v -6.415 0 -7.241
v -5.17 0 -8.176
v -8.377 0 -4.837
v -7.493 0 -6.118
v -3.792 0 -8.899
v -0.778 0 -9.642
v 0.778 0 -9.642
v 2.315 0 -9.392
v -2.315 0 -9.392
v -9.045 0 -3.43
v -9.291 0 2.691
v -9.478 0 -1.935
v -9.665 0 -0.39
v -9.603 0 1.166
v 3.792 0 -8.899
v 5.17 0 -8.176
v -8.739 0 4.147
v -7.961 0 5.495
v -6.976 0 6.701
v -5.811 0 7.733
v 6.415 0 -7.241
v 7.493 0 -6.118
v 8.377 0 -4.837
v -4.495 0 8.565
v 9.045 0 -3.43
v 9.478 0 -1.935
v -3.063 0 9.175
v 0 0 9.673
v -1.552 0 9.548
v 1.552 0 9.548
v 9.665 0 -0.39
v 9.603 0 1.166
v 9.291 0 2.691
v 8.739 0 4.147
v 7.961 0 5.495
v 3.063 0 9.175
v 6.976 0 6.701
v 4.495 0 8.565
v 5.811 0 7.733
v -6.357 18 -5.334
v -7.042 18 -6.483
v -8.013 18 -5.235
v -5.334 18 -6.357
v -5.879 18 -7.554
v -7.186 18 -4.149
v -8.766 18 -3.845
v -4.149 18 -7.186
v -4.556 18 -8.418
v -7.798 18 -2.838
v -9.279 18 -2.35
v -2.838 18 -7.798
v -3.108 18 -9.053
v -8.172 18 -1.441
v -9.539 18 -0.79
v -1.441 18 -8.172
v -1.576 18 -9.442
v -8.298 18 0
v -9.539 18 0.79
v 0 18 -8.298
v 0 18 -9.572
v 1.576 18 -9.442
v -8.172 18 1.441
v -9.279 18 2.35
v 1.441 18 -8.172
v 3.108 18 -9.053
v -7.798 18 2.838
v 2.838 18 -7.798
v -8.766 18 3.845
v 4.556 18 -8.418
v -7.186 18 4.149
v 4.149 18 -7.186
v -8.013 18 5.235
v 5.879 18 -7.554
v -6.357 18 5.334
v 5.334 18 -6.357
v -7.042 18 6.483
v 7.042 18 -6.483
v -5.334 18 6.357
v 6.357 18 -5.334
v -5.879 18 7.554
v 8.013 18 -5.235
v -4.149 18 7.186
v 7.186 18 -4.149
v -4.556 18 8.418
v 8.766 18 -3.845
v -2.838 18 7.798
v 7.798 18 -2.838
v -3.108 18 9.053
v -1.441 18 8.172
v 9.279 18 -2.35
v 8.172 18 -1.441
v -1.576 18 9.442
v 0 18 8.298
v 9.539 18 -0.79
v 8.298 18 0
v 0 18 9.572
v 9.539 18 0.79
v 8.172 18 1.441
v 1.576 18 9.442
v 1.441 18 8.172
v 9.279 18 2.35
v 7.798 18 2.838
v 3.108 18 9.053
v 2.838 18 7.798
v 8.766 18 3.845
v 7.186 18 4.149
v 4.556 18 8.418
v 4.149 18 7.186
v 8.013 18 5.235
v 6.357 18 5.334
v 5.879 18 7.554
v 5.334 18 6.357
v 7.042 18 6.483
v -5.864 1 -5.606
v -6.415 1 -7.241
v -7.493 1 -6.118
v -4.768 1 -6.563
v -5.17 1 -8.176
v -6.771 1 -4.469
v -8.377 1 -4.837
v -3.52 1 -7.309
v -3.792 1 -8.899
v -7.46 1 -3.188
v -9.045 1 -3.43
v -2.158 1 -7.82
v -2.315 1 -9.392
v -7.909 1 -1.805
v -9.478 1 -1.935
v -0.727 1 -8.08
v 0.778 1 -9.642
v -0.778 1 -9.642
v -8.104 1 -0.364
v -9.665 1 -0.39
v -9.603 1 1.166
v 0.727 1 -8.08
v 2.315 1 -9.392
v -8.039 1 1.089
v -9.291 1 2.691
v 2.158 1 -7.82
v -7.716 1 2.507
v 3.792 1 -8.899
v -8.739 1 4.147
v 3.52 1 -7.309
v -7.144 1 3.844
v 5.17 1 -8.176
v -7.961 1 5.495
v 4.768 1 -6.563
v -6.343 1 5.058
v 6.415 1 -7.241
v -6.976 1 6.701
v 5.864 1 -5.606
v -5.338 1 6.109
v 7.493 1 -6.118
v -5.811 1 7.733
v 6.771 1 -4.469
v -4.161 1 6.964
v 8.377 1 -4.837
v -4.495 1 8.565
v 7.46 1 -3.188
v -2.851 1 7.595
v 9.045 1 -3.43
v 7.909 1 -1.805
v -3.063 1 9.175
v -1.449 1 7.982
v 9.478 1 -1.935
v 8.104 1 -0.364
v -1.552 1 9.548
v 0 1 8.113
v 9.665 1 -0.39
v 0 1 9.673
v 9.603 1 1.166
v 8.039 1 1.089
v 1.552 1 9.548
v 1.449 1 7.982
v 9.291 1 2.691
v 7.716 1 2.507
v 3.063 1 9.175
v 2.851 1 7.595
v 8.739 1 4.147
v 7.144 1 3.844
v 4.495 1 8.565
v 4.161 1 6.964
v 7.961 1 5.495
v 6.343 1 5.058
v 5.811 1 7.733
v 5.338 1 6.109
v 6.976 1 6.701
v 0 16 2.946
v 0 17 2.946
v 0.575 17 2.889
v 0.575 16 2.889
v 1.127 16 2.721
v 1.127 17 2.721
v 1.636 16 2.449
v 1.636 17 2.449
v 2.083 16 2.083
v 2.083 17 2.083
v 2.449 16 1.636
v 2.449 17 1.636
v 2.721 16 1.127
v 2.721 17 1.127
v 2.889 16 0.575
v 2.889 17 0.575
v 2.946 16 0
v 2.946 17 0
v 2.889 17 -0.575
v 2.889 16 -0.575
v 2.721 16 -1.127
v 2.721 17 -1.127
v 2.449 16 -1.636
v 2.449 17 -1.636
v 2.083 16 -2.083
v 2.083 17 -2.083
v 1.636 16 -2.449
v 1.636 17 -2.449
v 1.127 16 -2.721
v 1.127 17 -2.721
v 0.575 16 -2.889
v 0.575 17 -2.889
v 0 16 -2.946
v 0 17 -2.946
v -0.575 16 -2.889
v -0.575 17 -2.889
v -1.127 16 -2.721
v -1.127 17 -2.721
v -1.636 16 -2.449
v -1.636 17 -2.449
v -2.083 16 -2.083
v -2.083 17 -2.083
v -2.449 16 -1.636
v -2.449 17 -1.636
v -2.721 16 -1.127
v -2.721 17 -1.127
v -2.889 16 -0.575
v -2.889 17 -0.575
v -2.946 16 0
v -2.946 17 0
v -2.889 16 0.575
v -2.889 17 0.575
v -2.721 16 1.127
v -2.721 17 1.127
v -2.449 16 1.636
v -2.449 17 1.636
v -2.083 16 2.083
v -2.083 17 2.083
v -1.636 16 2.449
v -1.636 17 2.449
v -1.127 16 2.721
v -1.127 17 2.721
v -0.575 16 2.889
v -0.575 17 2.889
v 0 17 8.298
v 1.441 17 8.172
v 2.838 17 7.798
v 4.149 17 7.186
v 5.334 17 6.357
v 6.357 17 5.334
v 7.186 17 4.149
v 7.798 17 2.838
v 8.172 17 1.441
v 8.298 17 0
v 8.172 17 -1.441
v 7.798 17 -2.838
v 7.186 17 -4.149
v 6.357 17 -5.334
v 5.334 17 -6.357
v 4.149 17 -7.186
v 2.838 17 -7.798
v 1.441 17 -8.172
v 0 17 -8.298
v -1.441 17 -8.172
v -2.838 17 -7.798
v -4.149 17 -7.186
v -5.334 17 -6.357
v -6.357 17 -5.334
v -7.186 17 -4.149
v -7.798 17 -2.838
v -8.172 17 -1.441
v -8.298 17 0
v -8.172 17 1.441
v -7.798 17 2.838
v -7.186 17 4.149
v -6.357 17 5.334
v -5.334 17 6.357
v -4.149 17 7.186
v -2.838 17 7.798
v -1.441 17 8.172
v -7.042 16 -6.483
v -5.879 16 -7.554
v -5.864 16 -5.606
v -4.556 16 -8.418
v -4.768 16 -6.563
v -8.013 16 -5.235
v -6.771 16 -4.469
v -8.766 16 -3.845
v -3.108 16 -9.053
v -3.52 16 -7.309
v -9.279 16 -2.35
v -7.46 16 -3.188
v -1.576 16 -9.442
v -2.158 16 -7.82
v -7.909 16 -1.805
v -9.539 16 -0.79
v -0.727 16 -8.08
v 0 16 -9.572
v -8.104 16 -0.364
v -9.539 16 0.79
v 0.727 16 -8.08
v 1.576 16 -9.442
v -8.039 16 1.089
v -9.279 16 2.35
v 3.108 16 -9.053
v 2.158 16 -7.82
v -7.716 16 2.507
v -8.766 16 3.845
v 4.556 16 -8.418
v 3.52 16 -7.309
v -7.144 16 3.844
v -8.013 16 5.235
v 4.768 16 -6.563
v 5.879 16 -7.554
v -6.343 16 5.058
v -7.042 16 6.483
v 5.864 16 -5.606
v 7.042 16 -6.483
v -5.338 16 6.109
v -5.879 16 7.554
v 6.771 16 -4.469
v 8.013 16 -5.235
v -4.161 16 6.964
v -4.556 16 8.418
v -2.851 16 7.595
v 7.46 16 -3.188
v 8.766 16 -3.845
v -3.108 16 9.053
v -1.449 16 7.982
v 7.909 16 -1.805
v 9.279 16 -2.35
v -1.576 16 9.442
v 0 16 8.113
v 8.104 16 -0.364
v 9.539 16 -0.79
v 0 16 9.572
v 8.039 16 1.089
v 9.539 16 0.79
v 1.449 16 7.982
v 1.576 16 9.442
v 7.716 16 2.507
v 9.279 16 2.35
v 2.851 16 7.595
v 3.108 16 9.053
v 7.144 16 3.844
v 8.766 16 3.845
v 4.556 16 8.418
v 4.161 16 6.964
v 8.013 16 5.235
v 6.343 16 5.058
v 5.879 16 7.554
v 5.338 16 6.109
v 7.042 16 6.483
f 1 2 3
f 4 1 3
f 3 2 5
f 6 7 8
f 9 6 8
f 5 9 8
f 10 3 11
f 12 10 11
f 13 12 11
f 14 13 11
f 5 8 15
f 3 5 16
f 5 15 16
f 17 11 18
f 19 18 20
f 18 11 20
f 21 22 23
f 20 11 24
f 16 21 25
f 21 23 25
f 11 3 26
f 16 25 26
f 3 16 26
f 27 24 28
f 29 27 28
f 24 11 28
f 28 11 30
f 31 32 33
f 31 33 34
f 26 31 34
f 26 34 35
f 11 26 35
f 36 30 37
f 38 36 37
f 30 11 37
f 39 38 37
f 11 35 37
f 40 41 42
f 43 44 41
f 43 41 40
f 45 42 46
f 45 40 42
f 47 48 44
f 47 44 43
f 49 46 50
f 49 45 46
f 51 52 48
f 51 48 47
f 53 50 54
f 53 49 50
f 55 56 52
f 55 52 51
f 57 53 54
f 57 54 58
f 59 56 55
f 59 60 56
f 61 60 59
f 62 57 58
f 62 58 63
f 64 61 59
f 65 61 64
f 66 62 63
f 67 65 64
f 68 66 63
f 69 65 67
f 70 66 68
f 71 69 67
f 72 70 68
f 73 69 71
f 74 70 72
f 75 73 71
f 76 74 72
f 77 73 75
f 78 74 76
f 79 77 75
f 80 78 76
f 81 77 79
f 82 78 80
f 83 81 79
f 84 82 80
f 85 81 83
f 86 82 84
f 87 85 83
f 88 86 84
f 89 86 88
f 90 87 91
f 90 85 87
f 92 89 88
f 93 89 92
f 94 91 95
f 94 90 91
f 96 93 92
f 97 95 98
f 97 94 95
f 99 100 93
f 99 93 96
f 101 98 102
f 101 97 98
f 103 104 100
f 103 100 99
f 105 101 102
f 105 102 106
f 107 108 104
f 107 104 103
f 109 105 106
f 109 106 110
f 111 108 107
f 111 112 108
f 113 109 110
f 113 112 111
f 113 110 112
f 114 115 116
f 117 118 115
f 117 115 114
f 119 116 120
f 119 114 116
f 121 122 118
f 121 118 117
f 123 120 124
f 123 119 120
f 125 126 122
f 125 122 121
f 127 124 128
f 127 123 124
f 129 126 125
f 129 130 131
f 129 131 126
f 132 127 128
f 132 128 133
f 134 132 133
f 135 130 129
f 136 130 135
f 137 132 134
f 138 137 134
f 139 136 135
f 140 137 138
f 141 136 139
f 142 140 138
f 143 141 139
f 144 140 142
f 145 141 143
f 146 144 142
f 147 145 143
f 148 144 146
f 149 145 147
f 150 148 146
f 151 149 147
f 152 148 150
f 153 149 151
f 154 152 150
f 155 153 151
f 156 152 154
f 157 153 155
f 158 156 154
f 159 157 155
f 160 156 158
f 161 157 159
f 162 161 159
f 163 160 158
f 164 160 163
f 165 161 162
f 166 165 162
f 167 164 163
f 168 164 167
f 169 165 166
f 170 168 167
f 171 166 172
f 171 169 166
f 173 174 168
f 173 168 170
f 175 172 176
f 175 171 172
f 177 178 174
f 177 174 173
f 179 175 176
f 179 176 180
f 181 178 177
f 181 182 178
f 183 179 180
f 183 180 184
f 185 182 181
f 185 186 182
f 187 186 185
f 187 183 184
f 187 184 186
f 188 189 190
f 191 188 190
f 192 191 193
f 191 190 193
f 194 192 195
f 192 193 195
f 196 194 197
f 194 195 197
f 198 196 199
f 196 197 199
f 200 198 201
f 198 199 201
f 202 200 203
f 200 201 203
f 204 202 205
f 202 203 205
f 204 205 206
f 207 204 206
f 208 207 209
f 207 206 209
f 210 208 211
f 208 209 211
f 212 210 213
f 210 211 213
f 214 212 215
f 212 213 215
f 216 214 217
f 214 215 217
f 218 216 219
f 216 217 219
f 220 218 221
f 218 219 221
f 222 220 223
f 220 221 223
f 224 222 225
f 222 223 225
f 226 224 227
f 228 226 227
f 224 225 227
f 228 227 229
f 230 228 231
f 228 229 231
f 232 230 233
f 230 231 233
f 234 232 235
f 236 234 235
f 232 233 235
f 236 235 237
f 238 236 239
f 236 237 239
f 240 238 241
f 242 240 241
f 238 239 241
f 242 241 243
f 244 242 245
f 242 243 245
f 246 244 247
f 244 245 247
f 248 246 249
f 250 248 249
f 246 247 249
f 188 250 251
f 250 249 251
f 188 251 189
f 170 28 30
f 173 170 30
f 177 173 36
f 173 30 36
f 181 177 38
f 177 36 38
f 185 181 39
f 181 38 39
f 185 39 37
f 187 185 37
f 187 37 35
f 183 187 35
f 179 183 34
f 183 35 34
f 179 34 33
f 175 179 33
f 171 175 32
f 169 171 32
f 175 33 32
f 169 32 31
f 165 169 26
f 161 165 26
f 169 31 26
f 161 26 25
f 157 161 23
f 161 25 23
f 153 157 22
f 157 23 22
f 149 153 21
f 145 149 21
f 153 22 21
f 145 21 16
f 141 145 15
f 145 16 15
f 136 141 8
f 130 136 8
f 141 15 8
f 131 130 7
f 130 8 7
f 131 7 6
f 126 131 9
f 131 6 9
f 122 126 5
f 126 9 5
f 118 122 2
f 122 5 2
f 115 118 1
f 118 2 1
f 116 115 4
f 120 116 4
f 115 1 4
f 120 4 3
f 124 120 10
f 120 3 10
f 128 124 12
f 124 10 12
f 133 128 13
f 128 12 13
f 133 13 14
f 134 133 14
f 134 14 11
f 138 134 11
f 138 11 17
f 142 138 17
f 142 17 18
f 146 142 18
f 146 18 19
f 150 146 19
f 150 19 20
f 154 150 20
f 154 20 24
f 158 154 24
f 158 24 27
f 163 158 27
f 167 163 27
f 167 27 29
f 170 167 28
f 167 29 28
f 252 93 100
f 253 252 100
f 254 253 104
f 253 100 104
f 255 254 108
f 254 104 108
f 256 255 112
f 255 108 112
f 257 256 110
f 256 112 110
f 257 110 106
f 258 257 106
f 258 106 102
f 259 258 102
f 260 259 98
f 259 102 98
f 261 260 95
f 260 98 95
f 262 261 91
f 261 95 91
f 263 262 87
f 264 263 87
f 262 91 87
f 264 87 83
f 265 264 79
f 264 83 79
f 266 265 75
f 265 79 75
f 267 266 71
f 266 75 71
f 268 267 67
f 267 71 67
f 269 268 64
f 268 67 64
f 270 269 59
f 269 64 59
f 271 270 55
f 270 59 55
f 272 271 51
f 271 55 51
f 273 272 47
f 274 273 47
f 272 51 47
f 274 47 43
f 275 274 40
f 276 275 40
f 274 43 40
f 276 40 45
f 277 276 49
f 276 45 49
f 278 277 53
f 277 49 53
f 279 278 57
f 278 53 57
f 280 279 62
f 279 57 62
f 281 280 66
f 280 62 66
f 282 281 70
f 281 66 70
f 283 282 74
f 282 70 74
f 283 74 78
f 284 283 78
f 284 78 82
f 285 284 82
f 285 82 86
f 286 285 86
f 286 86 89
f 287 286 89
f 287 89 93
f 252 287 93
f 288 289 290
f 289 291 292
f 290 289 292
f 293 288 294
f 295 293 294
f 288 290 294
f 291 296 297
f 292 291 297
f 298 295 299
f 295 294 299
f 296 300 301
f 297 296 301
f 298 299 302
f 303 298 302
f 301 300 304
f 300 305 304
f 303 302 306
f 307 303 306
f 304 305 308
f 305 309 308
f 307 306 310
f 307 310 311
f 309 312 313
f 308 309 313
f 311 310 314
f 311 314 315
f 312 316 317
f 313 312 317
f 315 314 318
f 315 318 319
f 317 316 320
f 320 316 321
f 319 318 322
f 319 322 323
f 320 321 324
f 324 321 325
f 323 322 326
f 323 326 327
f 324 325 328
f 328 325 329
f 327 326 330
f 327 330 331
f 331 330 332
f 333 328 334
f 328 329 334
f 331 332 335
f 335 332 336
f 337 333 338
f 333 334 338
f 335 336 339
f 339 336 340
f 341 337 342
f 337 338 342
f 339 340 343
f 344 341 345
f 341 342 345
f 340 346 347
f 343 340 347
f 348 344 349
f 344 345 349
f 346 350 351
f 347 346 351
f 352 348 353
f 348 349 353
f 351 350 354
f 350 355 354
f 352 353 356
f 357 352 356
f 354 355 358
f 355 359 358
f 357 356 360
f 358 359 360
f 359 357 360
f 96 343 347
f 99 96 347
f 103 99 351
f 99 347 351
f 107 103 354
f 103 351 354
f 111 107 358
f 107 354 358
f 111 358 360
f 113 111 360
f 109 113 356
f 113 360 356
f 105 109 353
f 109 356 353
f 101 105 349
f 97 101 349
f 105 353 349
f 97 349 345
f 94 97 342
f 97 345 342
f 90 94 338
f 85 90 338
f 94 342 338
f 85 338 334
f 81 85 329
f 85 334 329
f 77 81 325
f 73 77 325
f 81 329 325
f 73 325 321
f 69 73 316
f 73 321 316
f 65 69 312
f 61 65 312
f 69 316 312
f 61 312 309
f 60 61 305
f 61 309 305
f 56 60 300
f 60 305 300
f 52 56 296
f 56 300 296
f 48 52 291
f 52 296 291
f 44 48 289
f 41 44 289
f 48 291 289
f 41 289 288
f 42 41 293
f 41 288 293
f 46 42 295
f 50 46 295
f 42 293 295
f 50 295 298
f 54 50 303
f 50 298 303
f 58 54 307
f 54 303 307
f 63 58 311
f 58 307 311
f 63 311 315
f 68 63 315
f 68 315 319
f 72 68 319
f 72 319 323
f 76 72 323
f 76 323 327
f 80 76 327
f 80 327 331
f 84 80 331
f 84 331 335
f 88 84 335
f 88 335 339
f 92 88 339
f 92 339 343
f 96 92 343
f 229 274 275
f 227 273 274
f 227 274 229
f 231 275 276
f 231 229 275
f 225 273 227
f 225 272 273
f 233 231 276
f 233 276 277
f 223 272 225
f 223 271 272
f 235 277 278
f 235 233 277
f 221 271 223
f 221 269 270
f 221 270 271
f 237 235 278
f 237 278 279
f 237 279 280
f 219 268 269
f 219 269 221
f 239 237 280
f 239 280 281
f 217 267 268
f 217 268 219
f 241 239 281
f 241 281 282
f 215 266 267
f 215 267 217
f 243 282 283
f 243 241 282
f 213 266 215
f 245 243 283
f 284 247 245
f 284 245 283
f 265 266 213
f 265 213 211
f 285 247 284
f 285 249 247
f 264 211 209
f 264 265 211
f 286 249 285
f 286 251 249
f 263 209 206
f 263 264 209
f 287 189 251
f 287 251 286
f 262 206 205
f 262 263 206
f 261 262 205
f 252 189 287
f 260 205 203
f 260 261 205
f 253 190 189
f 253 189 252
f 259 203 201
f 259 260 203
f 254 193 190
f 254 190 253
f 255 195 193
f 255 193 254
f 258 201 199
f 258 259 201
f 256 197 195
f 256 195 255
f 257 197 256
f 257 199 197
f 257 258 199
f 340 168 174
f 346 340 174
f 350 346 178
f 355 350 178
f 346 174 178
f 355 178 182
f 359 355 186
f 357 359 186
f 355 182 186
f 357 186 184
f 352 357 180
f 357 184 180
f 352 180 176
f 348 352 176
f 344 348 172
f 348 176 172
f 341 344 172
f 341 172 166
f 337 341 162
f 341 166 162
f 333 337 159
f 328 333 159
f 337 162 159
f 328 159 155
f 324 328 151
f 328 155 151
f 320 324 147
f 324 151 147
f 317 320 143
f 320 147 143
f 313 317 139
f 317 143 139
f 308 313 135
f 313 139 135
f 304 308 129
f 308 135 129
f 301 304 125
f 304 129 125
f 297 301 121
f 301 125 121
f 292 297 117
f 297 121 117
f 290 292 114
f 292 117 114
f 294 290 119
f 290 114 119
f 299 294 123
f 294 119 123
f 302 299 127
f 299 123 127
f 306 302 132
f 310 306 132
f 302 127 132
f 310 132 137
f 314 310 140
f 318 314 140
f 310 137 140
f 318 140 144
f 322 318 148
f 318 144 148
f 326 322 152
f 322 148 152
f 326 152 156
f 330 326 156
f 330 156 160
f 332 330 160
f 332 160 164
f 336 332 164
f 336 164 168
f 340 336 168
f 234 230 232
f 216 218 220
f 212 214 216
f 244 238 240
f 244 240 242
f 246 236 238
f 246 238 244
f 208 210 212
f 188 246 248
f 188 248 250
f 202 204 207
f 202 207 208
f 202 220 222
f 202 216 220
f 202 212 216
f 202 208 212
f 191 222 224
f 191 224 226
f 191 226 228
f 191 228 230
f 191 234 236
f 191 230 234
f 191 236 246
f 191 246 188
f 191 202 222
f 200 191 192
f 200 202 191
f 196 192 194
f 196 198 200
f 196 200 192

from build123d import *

# Parameters (mm, degrees)
SKETCH1_R           = 9.67330264
BOSS_EXTRUDE1_DEPTH = 1
SKETCH2_R           = 8.112606278
BOSS_EXTRUDE2_DEPTH = 15
SKETCH3_R           = 9.572114115
BOSS_EXTRUDE3_DEPTH = 2
SKETCH4_R           = 8.298124112
CUT_EXTRUDE2_DEPTH  = 1
SKETCH5_R           = 2.945552355
CUT_EXTRUDE3_DEPTH  = 1


with BuildPart() as part:
    # Sketch1 → Boss-Extrude1 (new body)
    with BuildSketch(Plane(origin=(0, 0, 0), x_dir=(1, 0, 0), z_dir=(0, 1, 0))):
        with Locations(Location((0, 0, 0), (0, 0, 270))):
            Circle(SKETCH1_R)
    extrude(amount=BOSS_EXTRUDE1_DEPTH)

    # Sketch2 → Boss-Extrude2 (add)
    with BuildSketch(Plane(origin=(0, 1, 0), x_dir=(1, 0, 0), z_dir=(0, 1, 0))):
        with Locations(Location((0, 0, 0), (0, 0, 270))):
            Circle(SKETCH2_R)
    extrude(amount=BOSS_EXTRUDE2_DEPTH)

    # Sketch3 → Boss-Extrude3 (add)
    with BuildSketch(Plane(origin=(0, 16, 0), x_dir=(1, 0, 0), z_dir=(0, 1, 0))):
        with Locations(Location((0, 0, 0), (0, 0, 270))):
            Circle(SKETCH3_R)
    extrude(amount=BOSS_EXTRUDE3_DEPTH)

    # Sketch4 → Cut-Extrude2 (cut)
    with BuildSketch(Plane(origin=(0, 18, 0), x_dir=(1, 0, 0), z_dir=(0, 1, 0))):
        with Locations(Location((0, 0, 0), (0, 0, 270))):
            Circle(SKETCH4_R)
    extrude(amount=-CUT_EXTRUDE2_DEPTH, mode=Mode.SUBTRACT)

    # Sketch5 → Cut-Extrude3 (cut)
    with BuildSketch(Plane(origin=(0, 17, 0), x_dir=(1, 0, 0), z_dir=(0, 1, 0))):
        with Locations(Location((0, 0, 0), (0, 0, 270))):
            Circle(SKETCH5_R)
    extrude(amount=-CUT_EXTRUDE3_DEPTH, mode=Mode.SUBTRACT)


solid = part.part
